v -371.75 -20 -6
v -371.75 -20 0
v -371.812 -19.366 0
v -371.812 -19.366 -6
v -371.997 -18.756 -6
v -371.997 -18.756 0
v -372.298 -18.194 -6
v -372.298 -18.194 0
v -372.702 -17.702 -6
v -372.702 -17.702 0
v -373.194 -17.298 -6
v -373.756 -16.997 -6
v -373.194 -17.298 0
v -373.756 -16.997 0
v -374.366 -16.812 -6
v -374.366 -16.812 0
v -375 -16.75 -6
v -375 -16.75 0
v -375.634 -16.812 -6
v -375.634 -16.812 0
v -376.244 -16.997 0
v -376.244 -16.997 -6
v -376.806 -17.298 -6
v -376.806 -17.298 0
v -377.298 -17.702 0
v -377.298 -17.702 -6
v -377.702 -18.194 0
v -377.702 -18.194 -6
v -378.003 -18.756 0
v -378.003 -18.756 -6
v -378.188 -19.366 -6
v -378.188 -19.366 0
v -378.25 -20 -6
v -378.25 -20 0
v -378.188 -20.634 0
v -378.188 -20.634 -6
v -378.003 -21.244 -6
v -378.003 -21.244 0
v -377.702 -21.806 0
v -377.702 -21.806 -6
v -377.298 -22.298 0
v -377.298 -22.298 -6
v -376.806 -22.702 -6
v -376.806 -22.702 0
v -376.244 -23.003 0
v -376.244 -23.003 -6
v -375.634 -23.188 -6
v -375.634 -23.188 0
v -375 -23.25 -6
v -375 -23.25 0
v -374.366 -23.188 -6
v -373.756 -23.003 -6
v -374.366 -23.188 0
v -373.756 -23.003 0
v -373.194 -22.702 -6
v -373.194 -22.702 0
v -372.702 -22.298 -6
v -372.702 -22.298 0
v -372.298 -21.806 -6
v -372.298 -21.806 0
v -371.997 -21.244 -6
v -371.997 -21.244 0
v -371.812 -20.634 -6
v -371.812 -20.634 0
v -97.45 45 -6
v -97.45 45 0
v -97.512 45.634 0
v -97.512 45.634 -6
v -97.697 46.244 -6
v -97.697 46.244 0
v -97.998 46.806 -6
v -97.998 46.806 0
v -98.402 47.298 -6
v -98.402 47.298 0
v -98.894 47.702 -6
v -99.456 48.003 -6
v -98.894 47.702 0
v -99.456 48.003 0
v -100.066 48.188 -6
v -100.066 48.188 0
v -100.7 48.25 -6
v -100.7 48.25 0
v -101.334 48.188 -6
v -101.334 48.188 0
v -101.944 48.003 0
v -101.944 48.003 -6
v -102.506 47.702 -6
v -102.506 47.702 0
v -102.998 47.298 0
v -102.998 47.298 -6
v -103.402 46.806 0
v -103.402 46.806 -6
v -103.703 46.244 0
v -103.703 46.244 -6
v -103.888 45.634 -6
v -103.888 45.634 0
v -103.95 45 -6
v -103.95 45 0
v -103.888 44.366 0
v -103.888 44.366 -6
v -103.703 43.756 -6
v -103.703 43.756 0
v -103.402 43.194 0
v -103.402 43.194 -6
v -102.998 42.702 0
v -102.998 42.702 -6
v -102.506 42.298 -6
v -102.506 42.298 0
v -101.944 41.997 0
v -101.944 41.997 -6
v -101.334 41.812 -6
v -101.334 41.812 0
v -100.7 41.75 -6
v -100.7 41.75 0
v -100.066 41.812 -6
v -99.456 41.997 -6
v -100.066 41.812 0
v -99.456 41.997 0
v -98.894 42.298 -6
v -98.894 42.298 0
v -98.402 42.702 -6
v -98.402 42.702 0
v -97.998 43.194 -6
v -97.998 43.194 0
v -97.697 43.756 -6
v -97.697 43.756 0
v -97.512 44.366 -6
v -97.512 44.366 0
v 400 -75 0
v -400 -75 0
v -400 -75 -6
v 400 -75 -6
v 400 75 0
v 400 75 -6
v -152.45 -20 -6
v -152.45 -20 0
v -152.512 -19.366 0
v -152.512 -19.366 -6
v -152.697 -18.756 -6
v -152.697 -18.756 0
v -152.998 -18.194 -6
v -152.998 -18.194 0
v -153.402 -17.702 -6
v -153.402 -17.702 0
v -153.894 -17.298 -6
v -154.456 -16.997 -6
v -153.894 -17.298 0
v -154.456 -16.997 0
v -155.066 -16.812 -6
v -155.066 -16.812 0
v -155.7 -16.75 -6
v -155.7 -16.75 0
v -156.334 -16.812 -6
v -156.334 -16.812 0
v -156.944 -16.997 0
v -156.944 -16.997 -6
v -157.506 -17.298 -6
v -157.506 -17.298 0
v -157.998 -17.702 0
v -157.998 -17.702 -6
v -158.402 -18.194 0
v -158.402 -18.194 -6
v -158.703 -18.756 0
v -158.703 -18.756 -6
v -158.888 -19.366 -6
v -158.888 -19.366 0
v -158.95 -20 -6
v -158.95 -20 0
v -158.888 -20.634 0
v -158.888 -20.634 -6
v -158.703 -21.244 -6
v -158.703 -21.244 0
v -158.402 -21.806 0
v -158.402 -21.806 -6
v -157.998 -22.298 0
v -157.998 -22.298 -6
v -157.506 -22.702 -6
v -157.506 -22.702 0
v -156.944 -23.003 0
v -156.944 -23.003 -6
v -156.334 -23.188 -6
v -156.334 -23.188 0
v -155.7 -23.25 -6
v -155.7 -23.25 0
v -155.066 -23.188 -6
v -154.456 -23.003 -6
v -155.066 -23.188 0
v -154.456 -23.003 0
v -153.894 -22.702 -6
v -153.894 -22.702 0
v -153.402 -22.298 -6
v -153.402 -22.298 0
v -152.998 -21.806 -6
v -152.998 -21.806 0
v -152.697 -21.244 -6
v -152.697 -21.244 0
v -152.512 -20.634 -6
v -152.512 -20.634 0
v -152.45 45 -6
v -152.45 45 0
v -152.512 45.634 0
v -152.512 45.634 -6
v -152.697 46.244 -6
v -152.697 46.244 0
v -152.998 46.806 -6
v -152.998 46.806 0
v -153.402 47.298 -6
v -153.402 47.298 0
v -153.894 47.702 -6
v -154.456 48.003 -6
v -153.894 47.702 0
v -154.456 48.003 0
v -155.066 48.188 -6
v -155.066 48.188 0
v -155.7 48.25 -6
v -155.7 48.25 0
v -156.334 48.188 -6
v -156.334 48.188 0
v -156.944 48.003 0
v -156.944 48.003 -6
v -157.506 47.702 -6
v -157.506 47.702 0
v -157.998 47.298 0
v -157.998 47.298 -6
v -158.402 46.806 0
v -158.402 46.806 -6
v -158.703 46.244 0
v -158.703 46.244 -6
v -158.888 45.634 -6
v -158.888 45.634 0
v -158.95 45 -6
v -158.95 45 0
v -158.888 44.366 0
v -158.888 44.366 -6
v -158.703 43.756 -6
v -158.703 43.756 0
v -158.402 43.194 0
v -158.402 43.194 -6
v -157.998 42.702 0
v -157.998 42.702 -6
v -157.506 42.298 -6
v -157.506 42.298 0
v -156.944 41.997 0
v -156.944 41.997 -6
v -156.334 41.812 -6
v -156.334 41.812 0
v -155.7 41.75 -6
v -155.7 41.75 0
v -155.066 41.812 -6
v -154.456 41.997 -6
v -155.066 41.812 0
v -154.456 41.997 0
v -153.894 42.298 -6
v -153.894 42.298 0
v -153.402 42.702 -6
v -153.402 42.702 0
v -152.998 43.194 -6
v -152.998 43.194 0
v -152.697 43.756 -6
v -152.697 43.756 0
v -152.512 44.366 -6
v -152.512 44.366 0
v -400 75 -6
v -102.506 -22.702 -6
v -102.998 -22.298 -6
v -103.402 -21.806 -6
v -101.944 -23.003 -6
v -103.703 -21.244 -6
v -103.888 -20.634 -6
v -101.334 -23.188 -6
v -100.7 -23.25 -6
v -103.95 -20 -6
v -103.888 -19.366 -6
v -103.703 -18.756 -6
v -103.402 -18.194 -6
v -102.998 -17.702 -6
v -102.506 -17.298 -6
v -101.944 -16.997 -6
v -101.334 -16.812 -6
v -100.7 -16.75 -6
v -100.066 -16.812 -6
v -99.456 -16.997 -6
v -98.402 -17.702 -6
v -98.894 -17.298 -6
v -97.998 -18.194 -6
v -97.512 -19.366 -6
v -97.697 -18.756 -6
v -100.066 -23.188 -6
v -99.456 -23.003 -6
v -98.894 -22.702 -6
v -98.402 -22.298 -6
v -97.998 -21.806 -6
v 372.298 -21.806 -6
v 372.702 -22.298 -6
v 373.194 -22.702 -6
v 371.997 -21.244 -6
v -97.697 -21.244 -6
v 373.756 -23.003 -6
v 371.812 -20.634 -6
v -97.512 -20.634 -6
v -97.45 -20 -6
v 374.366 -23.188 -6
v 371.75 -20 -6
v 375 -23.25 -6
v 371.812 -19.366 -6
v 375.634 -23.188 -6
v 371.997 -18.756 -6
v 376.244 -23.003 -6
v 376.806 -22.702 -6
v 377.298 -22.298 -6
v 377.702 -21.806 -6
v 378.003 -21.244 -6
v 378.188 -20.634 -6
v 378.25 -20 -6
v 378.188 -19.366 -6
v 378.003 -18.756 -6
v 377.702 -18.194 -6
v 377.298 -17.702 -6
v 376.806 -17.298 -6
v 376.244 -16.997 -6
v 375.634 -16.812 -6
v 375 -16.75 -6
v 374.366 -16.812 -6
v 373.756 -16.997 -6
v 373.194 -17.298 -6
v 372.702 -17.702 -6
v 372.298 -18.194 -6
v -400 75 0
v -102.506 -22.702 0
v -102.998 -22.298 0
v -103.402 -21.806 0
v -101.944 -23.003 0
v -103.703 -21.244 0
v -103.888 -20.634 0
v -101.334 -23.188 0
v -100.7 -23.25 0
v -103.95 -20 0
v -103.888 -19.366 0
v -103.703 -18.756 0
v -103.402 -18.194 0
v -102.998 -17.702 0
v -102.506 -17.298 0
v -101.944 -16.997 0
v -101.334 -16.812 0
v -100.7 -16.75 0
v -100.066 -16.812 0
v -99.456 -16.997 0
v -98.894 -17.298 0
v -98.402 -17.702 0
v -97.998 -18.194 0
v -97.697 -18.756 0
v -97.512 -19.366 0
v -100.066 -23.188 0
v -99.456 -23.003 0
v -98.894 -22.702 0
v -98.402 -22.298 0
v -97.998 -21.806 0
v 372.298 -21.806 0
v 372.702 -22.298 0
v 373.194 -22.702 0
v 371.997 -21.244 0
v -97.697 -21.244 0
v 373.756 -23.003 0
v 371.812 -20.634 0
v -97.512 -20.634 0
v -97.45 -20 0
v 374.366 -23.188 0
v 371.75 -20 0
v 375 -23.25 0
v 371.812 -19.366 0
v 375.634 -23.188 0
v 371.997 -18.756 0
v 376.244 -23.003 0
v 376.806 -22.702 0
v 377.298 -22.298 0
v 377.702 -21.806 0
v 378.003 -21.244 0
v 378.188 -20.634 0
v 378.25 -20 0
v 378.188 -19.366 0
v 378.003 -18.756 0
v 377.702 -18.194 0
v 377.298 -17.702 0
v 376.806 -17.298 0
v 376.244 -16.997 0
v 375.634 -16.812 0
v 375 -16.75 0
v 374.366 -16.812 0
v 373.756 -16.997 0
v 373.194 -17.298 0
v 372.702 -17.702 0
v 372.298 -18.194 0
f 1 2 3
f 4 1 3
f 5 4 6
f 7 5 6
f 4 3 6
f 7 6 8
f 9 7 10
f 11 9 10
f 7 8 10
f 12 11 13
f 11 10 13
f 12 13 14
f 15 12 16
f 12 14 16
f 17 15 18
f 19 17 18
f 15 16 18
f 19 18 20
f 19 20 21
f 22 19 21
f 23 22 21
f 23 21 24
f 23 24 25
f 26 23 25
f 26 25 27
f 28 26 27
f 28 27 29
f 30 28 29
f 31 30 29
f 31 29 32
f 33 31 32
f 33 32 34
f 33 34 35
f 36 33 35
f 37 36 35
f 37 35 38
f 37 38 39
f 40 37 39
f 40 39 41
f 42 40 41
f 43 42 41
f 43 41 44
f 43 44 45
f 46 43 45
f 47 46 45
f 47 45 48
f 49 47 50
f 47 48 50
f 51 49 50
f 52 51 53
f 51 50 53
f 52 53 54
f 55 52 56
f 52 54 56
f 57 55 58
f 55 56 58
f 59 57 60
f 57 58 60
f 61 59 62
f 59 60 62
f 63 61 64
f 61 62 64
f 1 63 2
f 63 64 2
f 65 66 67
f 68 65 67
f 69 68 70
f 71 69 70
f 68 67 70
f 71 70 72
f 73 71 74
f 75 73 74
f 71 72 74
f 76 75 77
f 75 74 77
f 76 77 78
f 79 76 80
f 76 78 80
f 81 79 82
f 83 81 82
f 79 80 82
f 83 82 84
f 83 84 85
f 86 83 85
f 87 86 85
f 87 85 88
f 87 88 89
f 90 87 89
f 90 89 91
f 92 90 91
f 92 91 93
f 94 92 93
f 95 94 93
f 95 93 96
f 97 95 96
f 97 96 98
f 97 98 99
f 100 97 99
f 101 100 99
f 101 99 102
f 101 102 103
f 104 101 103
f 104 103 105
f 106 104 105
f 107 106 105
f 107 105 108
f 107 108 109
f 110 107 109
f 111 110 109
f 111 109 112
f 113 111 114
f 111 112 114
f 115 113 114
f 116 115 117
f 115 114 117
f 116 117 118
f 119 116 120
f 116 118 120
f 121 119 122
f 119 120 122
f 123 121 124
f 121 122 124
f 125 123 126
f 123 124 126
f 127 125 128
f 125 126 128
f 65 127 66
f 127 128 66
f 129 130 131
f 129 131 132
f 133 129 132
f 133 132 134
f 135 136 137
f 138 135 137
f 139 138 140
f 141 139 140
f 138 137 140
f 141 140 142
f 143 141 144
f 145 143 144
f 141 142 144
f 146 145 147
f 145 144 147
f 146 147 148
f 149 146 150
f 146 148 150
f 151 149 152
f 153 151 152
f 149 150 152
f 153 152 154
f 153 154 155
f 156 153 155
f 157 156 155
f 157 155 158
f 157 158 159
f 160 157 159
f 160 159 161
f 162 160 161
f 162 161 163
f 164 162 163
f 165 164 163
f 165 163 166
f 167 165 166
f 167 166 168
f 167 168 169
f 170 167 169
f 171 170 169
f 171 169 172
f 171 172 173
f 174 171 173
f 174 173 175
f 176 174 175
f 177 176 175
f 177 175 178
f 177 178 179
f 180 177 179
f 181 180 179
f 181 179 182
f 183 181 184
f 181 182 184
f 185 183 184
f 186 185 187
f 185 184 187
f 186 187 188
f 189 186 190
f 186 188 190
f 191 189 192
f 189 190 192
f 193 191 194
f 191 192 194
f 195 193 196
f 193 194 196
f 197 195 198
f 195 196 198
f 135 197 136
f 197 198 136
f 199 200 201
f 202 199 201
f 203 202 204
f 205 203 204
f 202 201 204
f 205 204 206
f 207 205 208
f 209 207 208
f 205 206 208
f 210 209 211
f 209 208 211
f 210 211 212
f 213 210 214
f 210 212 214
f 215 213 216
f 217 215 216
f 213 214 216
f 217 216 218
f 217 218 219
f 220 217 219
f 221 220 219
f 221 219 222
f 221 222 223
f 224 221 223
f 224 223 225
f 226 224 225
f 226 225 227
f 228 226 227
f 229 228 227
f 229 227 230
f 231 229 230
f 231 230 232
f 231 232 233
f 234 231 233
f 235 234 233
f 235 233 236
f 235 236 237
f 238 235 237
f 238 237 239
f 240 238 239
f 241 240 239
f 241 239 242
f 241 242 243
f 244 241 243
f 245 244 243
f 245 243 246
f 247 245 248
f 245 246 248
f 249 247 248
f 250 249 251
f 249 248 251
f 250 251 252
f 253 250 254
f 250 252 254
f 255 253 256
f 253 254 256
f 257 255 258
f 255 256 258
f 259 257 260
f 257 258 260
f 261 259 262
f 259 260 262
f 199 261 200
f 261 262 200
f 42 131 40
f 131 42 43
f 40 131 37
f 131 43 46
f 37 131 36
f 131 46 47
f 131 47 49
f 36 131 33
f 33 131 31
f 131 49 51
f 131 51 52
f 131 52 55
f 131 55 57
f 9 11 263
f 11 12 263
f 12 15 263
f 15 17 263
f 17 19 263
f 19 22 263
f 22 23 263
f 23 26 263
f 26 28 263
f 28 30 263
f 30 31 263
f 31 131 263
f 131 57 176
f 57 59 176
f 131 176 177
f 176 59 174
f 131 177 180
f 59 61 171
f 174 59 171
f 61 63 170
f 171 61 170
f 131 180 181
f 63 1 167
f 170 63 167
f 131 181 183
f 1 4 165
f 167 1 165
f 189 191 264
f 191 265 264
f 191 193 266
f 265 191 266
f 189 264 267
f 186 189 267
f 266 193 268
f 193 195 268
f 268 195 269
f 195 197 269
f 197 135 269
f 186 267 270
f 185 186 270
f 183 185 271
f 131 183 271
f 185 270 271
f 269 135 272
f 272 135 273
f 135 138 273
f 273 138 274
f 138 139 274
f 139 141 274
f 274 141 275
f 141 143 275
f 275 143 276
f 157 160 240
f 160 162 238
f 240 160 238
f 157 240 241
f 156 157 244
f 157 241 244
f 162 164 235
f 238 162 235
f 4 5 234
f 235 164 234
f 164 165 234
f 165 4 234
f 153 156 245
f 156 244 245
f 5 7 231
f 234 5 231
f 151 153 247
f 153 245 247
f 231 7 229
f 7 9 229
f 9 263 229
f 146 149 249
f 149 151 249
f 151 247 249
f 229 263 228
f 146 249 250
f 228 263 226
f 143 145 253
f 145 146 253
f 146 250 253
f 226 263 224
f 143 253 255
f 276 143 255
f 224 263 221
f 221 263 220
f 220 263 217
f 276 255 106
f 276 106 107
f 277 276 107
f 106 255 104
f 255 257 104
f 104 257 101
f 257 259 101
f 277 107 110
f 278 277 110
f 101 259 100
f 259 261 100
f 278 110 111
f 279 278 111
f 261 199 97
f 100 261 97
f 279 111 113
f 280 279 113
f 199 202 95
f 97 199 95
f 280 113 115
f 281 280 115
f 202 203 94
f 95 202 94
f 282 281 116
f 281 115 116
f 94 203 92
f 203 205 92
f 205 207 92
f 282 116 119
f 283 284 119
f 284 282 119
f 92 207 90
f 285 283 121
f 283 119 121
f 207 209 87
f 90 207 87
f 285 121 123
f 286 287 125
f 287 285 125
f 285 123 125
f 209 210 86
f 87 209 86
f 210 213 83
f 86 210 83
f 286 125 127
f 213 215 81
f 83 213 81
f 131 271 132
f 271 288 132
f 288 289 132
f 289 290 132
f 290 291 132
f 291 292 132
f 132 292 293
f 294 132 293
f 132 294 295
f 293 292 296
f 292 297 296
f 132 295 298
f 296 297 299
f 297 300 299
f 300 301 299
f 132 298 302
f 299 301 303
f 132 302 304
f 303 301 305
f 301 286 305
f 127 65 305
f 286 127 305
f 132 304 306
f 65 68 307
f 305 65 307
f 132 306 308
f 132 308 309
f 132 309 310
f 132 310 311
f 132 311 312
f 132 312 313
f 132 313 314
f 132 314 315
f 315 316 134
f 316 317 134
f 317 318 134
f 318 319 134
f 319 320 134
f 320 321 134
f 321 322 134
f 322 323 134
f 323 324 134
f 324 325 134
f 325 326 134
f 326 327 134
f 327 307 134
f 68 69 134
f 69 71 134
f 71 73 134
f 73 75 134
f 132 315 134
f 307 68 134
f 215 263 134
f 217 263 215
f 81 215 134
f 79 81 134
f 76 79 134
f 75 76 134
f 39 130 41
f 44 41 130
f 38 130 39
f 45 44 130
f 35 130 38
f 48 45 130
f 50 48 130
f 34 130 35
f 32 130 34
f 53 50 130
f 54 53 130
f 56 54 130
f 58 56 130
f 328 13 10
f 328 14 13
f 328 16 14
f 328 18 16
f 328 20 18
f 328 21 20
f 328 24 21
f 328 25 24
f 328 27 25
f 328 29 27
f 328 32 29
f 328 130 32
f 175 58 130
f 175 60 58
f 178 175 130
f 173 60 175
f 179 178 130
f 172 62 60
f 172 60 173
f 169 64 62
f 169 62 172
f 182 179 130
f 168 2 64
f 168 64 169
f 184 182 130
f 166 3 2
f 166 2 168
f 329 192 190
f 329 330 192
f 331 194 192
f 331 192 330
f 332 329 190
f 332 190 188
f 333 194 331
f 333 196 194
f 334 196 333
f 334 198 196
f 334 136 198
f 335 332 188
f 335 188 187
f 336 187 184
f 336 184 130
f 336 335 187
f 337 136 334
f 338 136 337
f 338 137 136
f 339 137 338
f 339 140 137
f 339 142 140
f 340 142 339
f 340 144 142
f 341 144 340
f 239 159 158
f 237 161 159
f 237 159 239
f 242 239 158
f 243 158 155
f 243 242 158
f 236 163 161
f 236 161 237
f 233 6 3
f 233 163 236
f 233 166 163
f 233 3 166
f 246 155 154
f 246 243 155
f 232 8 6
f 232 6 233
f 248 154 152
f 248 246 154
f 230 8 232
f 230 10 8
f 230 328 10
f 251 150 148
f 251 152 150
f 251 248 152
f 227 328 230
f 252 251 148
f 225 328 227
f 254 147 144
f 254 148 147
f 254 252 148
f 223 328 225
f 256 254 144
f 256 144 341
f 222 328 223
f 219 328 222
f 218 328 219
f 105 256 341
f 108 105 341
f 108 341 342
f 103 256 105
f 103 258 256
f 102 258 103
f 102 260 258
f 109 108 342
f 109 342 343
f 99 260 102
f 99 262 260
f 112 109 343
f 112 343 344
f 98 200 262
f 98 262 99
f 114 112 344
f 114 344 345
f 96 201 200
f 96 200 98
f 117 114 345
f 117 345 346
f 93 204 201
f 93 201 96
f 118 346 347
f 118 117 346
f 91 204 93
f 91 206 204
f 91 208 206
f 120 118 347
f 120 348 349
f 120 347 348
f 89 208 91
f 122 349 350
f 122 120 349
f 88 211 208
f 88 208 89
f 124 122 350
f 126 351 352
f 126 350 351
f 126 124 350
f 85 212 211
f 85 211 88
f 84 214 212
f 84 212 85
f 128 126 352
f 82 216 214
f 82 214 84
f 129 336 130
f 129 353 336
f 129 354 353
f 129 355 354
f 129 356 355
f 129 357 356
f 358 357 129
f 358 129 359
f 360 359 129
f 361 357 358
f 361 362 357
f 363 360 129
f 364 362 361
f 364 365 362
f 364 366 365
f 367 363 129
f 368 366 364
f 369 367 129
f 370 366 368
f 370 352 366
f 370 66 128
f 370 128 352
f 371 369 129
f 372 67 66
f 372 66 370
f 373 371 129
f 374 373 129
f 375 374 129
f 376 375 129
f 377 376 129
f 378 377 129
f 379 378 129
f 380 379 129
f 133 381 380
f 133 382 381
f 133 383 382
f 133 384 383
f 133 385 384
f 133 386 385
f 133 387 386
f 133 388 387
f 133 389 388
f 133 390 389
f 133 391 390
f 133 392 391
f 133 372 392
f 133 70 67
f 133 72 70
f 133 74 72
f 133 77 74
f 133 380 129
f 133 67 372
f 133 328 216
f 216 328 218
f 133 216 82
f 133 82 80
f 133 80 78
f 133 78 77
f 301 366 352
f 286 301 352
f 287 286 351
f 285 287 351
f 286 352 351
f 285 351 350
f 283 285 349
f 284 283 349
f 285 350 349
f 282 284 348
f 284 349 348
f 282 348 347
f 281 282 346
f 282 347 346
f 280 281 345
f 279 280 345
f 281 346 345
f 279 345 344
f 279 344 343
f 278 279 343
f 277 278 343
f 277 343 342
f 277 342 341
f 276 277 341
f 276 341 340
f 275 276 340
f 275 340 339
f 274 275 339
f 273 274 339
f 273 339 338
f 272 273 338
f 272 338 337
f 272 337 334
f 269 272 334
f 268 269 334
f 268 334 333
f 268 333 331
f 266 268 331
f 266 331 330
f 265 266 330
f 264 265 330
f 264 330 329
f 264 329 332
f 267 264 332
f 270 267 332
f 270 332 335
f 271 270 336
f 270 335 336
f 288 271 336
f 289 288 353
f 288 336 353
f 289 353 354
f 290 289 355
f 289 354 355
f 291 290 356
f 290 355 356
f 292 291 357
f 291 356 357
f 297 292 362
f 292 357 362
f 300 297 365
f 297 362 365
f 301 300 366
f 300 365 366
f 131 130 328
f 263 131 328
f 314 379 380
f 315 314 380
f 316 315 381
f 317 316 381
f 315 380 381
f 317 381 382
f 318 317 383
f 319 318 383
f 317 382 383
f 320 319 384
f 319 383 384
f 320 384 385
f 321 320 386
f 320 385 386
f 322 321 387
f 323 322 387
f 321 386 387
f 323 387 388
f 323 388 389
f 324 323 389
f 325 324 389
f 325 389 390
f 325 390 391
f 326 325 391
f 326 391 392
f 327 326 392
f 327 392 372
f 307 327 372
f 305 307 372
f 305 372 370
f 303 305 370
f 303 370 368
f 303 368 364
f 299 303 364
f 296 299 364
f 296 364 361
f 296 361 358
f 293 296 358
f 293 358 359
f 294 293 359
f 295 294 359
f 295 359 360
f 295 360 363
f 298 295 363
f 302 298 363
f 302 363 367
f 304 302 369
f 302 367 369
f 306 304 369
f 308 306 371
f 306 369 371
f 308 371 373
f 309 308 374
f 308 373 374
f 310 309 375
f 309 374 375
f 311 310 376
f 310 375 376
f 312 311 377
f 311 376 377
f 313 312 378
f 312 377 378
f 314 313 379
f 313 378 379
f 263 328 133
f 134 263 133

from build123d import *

# Parameters (mm, degrees)
SKETCH1_W          = 800
SKETCH1_H          = 150
BASE_FLANGE1_DEPTH = 6
SKETCH2_R          = 3.25
CUT_EXTRUDE1_DEPTH = 10
SKETCH3_R          = 3.25
CUT_EXTRUDE2_DEPTH = 408.014741748


# Sheet-metal steps are written as plain solids
with BuildPart() as part:
    # Sketch1 → Base-Flange1 (new body)
    with BuildSketch(Plane.XY):
        Rectangle(SKETCH1_W, SKETCH1_H)
    extrude(amount=-BASE_FLANGE1_DEPTH)

    # Sketch2 → Cut-Extrude1 (cut)
    with BuildSketch(Plane.XY):
        with Locations((-375, -20)):
            Circle(SKETCH2_R)
        with Locations((375, -20)):
            Circle(SKETCH2_R)
    extrude(amount=-CUT_EXTRUDE1_DEPTH, mode=Mode.SUBTRACT)

    # Sketch3 → Cut-Extrude2 (cut, through all)
    with BuildSketch(Plane.XY):
        with Locations((-100.7, 45)):
            Circle(SKETCH3_R)
        with Locations((-155.7, 45)):
            Circle(SKETCH3_R)
        with Locations((-100.7, -20)):
            Circle(SKETCH3_R)
        with Locations((-155.7, -20)):
            Circle(SKETCH3_R)
    extrude(amount=-CUT_EXTRUDE2_DEPTH, mode=Mode.SUBTRACT)


solid = part.part
